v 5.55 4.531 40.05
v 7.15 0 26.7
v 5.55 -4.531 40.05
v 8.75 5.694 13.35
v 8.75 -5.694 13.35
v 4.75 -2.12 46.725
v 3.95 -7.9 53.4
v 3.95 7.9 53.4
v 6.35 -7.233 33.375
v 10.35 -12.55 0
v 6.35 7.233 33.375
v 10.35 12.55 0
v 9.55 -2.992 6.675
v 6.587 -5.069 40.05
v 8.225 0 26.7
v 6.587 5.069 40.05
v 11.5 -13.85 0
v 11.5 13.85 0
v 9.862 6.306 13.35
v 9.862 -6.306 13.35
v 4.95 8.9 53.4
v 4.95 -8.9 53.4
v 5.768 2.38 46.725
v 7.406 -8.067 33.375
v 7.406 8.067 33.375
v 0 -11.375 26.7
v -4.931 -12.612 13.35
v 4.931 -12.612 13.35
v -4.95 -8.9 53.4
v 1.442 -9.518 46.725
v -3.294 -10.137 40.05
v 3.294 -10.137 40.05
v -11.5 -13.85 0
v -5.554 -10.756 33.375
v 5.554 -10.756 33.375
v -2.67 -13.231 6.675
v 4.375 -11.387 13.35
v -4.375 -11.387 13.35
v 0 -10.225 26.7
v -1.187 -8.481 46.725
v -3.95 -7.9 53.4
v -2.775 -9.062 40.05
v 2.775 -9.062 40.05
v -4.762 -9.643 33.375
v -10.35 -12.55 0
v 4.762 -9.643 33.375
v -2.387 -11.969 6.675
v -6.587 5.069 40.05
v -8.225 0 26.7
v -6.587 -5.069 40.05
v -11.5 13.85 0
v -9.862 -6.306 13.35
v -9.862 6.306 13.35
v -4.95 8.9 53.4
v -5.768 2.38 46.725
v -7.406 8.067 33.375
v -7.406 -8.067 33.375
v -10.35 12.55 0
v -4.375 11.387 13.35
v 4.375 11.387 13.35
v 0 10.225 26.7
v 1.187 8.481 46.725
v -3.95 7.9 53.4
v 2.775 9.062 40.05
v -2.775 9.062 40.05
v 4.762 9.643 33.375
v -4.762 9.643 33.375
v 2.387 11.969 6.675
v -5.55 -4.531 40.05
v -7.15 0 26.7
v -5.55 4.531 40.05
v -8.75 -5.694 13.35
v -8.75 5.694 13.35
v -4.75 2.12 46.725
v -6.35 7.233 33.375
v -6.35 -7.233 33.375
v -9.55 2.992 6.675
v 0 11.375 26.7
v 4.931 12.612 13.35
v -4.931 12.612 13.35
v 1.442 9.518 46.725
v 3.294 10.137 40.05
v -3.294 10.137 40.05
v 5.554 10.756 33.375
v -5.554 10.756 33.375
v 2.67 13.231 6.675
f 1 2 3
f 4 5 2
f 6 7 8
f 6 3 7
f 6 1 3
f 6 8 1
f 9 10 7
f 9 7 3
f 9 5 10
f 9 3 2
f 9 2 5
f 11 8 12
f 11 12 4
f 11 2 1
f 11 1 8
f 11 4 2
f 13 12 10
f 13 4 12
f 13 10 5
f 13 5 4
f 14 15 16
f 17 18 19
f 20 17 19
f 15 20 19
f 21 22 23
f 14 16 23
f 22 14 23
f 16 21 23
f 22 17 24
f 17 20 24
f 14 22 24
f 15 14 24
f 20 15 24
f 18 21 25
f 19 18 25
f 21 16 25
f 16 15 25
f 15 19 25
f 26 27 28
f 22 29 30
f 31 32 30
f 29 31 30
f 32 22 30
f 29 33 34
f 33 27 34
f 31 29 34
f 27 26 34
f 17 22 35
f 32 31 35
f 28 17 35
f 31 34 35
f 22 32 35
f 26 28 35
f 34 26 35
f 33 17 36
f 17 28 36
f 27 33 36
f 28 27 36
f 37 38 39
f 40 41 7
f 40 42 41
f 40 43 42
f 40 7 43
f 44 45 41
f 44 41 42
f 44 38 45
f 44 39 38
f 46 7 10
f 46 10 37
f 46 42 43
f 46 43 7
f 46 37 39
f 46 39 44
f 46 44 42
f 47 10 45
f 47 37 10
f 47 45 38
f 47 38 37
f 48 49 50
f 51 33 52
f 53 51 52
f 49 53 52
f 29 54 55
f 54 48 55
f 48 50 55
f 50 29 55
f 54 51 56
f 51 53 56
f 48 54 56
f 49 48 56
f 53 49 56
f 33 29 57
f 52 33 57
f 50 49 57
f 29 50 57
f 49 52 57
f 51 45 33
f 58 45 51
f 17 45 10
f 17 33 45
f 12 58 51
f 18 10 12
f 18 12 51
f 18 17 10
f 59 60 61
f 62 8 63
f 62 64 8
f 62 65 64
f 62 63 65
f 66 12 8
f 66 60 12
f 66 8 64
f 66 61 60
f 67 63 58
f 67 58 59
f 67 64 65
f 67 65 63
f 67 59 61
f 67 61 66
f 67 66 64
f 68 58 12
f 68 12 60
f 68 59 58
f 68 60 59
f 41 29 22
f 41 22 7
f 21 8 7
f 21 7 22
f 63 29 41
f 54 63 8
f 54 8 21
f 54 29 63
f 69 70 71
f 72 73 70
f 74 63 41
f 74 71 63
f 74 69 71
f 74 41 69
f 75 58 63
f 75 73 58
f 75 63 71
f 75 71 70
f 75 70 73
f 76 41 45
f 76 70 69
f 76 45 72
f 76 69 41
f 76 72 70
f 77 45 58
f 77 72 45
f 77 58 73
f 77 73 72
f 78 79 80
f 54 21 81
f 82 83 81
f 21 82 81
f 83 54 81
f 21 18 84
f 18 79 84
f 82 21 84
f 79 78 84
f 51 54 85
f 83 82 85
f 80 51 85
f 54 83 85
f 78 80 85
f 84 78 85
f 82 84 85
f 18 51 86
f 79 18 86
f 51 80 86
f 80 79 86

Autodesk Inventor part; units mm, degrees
ref_plane "YZ Plane" through (0, 0, 0) normal (1, 0, 0) x (0, 1, 0)
ref_plane "XZ Plane" through (0, 0, 0) normal (0, 1, 0) x (-1, 0, 0)
ref_plane "XY Plane" through (0, 0, 0) normal (0, 0, 1) x (1, 0, 0)
sketch "Sketch1" plane through (0, 0, 0) normal (0, 0, 1) x (1, 0, 0)
  line L0 (-11.5, -13.85) -> (11.5, -13.85)
  line L1 (11.5, -13.85) -> (11.5, 13.85)
  line L2 (11.5, 13.85) -> (-11.5, 13.85)
  line L3 (-11.5, 13.85) -> (-11.5, -13.85)
  line L4 (-11.5, -13.85) -> (11.5, 13.85) construction
  line L5 (11.5, -13.85) -> (-11.5, 13.85) construction
  point P0 (0, 0)
  dimension "d0" = 23
  dimension "d1" = 27.7
ref_plane "Work Plane2" through (11.5, -13.85, 53.4) normal (0, 0, 1) x (0, 1, 0)
ref_plane "Work Plane1" through (11.5, -13.85, 0) normal (0, 0, 1) x (0, 1, 0)
sketch "Sketch2" plane through (11.5, -13.85, 53.4) normal (0, 0, 1) x (0, 1, 0)
  line L0 (4.9505, 6.5505) -> (22.7495, 6.5505)
  line L1 (22.7495, 6.5505) -> (22.7495, 16.4495)
  line L2 (22.7495, 16.4495) -> (4.9505, 16.4495)
  line L3 (4.9505, 16.4495) -> (4.9505, 6.5505)
  line L4 (4.9505, 6.5505) -> (22.7495, 16.4495) construction
  line L5 (22.7495, 6.5505) -> (4.9505, 16.4495) construction
  point P0 (13.85, 11.5)
  dimension "d3" = 17.799
  dimension "d4" = 9.899
loft "Loft1" add profiles "Sketch2", "Sketch1"
sketch "Sketch4" plane through (11.5, -13.85, 0) normal (0, 0, -1) x (-1, 0, 0)
  line L0 (1.15, 1.3) -> (21.85, 1.3)
  line L1 (21.85, 1.3) -> (21.85, 26.4)
  line L2 (21.85, 26.4) -> (1.15, 26.4)
  line L3 (1.15, 26.4) -> (1.15, 1.3)
  line L4 (1.15, 1.3) -> (21.85, 26.4) construction
  line L5 (21.85, 1.3) -> (1.15, 26.4) construction
  point P0 (11.5, 13.85)
  dimension "d9" = 20.7
  dimension "d10" = 25.1
sketch "Sketch5" plane through (-4.9495, 8.8995, 53.4) normal (0, 0, 1) x (1, 0, 0)
  line L0 (1, -16.799) -> (8.899, -16.799)
  line L1 (8.899, -16.799) -> (8.899, -1)
  line L2 (8.899, -1) -> (1, -1)
  line L3 (1, -1) -> (1, -16.799)
  line L4 (1, -16.799) -> (8.899, -1) construction
  line L5 (8.899, -16.799) -> (1, -1) construction
  point P0 (4.9495, -8.8995)
  dimension "d11" = 7.899
  dimension "d12" = 15.799
loft "Loft2" cut profiles "Sketch5", "Sketch4"
properties part number "NewHorn" material "Copper"
